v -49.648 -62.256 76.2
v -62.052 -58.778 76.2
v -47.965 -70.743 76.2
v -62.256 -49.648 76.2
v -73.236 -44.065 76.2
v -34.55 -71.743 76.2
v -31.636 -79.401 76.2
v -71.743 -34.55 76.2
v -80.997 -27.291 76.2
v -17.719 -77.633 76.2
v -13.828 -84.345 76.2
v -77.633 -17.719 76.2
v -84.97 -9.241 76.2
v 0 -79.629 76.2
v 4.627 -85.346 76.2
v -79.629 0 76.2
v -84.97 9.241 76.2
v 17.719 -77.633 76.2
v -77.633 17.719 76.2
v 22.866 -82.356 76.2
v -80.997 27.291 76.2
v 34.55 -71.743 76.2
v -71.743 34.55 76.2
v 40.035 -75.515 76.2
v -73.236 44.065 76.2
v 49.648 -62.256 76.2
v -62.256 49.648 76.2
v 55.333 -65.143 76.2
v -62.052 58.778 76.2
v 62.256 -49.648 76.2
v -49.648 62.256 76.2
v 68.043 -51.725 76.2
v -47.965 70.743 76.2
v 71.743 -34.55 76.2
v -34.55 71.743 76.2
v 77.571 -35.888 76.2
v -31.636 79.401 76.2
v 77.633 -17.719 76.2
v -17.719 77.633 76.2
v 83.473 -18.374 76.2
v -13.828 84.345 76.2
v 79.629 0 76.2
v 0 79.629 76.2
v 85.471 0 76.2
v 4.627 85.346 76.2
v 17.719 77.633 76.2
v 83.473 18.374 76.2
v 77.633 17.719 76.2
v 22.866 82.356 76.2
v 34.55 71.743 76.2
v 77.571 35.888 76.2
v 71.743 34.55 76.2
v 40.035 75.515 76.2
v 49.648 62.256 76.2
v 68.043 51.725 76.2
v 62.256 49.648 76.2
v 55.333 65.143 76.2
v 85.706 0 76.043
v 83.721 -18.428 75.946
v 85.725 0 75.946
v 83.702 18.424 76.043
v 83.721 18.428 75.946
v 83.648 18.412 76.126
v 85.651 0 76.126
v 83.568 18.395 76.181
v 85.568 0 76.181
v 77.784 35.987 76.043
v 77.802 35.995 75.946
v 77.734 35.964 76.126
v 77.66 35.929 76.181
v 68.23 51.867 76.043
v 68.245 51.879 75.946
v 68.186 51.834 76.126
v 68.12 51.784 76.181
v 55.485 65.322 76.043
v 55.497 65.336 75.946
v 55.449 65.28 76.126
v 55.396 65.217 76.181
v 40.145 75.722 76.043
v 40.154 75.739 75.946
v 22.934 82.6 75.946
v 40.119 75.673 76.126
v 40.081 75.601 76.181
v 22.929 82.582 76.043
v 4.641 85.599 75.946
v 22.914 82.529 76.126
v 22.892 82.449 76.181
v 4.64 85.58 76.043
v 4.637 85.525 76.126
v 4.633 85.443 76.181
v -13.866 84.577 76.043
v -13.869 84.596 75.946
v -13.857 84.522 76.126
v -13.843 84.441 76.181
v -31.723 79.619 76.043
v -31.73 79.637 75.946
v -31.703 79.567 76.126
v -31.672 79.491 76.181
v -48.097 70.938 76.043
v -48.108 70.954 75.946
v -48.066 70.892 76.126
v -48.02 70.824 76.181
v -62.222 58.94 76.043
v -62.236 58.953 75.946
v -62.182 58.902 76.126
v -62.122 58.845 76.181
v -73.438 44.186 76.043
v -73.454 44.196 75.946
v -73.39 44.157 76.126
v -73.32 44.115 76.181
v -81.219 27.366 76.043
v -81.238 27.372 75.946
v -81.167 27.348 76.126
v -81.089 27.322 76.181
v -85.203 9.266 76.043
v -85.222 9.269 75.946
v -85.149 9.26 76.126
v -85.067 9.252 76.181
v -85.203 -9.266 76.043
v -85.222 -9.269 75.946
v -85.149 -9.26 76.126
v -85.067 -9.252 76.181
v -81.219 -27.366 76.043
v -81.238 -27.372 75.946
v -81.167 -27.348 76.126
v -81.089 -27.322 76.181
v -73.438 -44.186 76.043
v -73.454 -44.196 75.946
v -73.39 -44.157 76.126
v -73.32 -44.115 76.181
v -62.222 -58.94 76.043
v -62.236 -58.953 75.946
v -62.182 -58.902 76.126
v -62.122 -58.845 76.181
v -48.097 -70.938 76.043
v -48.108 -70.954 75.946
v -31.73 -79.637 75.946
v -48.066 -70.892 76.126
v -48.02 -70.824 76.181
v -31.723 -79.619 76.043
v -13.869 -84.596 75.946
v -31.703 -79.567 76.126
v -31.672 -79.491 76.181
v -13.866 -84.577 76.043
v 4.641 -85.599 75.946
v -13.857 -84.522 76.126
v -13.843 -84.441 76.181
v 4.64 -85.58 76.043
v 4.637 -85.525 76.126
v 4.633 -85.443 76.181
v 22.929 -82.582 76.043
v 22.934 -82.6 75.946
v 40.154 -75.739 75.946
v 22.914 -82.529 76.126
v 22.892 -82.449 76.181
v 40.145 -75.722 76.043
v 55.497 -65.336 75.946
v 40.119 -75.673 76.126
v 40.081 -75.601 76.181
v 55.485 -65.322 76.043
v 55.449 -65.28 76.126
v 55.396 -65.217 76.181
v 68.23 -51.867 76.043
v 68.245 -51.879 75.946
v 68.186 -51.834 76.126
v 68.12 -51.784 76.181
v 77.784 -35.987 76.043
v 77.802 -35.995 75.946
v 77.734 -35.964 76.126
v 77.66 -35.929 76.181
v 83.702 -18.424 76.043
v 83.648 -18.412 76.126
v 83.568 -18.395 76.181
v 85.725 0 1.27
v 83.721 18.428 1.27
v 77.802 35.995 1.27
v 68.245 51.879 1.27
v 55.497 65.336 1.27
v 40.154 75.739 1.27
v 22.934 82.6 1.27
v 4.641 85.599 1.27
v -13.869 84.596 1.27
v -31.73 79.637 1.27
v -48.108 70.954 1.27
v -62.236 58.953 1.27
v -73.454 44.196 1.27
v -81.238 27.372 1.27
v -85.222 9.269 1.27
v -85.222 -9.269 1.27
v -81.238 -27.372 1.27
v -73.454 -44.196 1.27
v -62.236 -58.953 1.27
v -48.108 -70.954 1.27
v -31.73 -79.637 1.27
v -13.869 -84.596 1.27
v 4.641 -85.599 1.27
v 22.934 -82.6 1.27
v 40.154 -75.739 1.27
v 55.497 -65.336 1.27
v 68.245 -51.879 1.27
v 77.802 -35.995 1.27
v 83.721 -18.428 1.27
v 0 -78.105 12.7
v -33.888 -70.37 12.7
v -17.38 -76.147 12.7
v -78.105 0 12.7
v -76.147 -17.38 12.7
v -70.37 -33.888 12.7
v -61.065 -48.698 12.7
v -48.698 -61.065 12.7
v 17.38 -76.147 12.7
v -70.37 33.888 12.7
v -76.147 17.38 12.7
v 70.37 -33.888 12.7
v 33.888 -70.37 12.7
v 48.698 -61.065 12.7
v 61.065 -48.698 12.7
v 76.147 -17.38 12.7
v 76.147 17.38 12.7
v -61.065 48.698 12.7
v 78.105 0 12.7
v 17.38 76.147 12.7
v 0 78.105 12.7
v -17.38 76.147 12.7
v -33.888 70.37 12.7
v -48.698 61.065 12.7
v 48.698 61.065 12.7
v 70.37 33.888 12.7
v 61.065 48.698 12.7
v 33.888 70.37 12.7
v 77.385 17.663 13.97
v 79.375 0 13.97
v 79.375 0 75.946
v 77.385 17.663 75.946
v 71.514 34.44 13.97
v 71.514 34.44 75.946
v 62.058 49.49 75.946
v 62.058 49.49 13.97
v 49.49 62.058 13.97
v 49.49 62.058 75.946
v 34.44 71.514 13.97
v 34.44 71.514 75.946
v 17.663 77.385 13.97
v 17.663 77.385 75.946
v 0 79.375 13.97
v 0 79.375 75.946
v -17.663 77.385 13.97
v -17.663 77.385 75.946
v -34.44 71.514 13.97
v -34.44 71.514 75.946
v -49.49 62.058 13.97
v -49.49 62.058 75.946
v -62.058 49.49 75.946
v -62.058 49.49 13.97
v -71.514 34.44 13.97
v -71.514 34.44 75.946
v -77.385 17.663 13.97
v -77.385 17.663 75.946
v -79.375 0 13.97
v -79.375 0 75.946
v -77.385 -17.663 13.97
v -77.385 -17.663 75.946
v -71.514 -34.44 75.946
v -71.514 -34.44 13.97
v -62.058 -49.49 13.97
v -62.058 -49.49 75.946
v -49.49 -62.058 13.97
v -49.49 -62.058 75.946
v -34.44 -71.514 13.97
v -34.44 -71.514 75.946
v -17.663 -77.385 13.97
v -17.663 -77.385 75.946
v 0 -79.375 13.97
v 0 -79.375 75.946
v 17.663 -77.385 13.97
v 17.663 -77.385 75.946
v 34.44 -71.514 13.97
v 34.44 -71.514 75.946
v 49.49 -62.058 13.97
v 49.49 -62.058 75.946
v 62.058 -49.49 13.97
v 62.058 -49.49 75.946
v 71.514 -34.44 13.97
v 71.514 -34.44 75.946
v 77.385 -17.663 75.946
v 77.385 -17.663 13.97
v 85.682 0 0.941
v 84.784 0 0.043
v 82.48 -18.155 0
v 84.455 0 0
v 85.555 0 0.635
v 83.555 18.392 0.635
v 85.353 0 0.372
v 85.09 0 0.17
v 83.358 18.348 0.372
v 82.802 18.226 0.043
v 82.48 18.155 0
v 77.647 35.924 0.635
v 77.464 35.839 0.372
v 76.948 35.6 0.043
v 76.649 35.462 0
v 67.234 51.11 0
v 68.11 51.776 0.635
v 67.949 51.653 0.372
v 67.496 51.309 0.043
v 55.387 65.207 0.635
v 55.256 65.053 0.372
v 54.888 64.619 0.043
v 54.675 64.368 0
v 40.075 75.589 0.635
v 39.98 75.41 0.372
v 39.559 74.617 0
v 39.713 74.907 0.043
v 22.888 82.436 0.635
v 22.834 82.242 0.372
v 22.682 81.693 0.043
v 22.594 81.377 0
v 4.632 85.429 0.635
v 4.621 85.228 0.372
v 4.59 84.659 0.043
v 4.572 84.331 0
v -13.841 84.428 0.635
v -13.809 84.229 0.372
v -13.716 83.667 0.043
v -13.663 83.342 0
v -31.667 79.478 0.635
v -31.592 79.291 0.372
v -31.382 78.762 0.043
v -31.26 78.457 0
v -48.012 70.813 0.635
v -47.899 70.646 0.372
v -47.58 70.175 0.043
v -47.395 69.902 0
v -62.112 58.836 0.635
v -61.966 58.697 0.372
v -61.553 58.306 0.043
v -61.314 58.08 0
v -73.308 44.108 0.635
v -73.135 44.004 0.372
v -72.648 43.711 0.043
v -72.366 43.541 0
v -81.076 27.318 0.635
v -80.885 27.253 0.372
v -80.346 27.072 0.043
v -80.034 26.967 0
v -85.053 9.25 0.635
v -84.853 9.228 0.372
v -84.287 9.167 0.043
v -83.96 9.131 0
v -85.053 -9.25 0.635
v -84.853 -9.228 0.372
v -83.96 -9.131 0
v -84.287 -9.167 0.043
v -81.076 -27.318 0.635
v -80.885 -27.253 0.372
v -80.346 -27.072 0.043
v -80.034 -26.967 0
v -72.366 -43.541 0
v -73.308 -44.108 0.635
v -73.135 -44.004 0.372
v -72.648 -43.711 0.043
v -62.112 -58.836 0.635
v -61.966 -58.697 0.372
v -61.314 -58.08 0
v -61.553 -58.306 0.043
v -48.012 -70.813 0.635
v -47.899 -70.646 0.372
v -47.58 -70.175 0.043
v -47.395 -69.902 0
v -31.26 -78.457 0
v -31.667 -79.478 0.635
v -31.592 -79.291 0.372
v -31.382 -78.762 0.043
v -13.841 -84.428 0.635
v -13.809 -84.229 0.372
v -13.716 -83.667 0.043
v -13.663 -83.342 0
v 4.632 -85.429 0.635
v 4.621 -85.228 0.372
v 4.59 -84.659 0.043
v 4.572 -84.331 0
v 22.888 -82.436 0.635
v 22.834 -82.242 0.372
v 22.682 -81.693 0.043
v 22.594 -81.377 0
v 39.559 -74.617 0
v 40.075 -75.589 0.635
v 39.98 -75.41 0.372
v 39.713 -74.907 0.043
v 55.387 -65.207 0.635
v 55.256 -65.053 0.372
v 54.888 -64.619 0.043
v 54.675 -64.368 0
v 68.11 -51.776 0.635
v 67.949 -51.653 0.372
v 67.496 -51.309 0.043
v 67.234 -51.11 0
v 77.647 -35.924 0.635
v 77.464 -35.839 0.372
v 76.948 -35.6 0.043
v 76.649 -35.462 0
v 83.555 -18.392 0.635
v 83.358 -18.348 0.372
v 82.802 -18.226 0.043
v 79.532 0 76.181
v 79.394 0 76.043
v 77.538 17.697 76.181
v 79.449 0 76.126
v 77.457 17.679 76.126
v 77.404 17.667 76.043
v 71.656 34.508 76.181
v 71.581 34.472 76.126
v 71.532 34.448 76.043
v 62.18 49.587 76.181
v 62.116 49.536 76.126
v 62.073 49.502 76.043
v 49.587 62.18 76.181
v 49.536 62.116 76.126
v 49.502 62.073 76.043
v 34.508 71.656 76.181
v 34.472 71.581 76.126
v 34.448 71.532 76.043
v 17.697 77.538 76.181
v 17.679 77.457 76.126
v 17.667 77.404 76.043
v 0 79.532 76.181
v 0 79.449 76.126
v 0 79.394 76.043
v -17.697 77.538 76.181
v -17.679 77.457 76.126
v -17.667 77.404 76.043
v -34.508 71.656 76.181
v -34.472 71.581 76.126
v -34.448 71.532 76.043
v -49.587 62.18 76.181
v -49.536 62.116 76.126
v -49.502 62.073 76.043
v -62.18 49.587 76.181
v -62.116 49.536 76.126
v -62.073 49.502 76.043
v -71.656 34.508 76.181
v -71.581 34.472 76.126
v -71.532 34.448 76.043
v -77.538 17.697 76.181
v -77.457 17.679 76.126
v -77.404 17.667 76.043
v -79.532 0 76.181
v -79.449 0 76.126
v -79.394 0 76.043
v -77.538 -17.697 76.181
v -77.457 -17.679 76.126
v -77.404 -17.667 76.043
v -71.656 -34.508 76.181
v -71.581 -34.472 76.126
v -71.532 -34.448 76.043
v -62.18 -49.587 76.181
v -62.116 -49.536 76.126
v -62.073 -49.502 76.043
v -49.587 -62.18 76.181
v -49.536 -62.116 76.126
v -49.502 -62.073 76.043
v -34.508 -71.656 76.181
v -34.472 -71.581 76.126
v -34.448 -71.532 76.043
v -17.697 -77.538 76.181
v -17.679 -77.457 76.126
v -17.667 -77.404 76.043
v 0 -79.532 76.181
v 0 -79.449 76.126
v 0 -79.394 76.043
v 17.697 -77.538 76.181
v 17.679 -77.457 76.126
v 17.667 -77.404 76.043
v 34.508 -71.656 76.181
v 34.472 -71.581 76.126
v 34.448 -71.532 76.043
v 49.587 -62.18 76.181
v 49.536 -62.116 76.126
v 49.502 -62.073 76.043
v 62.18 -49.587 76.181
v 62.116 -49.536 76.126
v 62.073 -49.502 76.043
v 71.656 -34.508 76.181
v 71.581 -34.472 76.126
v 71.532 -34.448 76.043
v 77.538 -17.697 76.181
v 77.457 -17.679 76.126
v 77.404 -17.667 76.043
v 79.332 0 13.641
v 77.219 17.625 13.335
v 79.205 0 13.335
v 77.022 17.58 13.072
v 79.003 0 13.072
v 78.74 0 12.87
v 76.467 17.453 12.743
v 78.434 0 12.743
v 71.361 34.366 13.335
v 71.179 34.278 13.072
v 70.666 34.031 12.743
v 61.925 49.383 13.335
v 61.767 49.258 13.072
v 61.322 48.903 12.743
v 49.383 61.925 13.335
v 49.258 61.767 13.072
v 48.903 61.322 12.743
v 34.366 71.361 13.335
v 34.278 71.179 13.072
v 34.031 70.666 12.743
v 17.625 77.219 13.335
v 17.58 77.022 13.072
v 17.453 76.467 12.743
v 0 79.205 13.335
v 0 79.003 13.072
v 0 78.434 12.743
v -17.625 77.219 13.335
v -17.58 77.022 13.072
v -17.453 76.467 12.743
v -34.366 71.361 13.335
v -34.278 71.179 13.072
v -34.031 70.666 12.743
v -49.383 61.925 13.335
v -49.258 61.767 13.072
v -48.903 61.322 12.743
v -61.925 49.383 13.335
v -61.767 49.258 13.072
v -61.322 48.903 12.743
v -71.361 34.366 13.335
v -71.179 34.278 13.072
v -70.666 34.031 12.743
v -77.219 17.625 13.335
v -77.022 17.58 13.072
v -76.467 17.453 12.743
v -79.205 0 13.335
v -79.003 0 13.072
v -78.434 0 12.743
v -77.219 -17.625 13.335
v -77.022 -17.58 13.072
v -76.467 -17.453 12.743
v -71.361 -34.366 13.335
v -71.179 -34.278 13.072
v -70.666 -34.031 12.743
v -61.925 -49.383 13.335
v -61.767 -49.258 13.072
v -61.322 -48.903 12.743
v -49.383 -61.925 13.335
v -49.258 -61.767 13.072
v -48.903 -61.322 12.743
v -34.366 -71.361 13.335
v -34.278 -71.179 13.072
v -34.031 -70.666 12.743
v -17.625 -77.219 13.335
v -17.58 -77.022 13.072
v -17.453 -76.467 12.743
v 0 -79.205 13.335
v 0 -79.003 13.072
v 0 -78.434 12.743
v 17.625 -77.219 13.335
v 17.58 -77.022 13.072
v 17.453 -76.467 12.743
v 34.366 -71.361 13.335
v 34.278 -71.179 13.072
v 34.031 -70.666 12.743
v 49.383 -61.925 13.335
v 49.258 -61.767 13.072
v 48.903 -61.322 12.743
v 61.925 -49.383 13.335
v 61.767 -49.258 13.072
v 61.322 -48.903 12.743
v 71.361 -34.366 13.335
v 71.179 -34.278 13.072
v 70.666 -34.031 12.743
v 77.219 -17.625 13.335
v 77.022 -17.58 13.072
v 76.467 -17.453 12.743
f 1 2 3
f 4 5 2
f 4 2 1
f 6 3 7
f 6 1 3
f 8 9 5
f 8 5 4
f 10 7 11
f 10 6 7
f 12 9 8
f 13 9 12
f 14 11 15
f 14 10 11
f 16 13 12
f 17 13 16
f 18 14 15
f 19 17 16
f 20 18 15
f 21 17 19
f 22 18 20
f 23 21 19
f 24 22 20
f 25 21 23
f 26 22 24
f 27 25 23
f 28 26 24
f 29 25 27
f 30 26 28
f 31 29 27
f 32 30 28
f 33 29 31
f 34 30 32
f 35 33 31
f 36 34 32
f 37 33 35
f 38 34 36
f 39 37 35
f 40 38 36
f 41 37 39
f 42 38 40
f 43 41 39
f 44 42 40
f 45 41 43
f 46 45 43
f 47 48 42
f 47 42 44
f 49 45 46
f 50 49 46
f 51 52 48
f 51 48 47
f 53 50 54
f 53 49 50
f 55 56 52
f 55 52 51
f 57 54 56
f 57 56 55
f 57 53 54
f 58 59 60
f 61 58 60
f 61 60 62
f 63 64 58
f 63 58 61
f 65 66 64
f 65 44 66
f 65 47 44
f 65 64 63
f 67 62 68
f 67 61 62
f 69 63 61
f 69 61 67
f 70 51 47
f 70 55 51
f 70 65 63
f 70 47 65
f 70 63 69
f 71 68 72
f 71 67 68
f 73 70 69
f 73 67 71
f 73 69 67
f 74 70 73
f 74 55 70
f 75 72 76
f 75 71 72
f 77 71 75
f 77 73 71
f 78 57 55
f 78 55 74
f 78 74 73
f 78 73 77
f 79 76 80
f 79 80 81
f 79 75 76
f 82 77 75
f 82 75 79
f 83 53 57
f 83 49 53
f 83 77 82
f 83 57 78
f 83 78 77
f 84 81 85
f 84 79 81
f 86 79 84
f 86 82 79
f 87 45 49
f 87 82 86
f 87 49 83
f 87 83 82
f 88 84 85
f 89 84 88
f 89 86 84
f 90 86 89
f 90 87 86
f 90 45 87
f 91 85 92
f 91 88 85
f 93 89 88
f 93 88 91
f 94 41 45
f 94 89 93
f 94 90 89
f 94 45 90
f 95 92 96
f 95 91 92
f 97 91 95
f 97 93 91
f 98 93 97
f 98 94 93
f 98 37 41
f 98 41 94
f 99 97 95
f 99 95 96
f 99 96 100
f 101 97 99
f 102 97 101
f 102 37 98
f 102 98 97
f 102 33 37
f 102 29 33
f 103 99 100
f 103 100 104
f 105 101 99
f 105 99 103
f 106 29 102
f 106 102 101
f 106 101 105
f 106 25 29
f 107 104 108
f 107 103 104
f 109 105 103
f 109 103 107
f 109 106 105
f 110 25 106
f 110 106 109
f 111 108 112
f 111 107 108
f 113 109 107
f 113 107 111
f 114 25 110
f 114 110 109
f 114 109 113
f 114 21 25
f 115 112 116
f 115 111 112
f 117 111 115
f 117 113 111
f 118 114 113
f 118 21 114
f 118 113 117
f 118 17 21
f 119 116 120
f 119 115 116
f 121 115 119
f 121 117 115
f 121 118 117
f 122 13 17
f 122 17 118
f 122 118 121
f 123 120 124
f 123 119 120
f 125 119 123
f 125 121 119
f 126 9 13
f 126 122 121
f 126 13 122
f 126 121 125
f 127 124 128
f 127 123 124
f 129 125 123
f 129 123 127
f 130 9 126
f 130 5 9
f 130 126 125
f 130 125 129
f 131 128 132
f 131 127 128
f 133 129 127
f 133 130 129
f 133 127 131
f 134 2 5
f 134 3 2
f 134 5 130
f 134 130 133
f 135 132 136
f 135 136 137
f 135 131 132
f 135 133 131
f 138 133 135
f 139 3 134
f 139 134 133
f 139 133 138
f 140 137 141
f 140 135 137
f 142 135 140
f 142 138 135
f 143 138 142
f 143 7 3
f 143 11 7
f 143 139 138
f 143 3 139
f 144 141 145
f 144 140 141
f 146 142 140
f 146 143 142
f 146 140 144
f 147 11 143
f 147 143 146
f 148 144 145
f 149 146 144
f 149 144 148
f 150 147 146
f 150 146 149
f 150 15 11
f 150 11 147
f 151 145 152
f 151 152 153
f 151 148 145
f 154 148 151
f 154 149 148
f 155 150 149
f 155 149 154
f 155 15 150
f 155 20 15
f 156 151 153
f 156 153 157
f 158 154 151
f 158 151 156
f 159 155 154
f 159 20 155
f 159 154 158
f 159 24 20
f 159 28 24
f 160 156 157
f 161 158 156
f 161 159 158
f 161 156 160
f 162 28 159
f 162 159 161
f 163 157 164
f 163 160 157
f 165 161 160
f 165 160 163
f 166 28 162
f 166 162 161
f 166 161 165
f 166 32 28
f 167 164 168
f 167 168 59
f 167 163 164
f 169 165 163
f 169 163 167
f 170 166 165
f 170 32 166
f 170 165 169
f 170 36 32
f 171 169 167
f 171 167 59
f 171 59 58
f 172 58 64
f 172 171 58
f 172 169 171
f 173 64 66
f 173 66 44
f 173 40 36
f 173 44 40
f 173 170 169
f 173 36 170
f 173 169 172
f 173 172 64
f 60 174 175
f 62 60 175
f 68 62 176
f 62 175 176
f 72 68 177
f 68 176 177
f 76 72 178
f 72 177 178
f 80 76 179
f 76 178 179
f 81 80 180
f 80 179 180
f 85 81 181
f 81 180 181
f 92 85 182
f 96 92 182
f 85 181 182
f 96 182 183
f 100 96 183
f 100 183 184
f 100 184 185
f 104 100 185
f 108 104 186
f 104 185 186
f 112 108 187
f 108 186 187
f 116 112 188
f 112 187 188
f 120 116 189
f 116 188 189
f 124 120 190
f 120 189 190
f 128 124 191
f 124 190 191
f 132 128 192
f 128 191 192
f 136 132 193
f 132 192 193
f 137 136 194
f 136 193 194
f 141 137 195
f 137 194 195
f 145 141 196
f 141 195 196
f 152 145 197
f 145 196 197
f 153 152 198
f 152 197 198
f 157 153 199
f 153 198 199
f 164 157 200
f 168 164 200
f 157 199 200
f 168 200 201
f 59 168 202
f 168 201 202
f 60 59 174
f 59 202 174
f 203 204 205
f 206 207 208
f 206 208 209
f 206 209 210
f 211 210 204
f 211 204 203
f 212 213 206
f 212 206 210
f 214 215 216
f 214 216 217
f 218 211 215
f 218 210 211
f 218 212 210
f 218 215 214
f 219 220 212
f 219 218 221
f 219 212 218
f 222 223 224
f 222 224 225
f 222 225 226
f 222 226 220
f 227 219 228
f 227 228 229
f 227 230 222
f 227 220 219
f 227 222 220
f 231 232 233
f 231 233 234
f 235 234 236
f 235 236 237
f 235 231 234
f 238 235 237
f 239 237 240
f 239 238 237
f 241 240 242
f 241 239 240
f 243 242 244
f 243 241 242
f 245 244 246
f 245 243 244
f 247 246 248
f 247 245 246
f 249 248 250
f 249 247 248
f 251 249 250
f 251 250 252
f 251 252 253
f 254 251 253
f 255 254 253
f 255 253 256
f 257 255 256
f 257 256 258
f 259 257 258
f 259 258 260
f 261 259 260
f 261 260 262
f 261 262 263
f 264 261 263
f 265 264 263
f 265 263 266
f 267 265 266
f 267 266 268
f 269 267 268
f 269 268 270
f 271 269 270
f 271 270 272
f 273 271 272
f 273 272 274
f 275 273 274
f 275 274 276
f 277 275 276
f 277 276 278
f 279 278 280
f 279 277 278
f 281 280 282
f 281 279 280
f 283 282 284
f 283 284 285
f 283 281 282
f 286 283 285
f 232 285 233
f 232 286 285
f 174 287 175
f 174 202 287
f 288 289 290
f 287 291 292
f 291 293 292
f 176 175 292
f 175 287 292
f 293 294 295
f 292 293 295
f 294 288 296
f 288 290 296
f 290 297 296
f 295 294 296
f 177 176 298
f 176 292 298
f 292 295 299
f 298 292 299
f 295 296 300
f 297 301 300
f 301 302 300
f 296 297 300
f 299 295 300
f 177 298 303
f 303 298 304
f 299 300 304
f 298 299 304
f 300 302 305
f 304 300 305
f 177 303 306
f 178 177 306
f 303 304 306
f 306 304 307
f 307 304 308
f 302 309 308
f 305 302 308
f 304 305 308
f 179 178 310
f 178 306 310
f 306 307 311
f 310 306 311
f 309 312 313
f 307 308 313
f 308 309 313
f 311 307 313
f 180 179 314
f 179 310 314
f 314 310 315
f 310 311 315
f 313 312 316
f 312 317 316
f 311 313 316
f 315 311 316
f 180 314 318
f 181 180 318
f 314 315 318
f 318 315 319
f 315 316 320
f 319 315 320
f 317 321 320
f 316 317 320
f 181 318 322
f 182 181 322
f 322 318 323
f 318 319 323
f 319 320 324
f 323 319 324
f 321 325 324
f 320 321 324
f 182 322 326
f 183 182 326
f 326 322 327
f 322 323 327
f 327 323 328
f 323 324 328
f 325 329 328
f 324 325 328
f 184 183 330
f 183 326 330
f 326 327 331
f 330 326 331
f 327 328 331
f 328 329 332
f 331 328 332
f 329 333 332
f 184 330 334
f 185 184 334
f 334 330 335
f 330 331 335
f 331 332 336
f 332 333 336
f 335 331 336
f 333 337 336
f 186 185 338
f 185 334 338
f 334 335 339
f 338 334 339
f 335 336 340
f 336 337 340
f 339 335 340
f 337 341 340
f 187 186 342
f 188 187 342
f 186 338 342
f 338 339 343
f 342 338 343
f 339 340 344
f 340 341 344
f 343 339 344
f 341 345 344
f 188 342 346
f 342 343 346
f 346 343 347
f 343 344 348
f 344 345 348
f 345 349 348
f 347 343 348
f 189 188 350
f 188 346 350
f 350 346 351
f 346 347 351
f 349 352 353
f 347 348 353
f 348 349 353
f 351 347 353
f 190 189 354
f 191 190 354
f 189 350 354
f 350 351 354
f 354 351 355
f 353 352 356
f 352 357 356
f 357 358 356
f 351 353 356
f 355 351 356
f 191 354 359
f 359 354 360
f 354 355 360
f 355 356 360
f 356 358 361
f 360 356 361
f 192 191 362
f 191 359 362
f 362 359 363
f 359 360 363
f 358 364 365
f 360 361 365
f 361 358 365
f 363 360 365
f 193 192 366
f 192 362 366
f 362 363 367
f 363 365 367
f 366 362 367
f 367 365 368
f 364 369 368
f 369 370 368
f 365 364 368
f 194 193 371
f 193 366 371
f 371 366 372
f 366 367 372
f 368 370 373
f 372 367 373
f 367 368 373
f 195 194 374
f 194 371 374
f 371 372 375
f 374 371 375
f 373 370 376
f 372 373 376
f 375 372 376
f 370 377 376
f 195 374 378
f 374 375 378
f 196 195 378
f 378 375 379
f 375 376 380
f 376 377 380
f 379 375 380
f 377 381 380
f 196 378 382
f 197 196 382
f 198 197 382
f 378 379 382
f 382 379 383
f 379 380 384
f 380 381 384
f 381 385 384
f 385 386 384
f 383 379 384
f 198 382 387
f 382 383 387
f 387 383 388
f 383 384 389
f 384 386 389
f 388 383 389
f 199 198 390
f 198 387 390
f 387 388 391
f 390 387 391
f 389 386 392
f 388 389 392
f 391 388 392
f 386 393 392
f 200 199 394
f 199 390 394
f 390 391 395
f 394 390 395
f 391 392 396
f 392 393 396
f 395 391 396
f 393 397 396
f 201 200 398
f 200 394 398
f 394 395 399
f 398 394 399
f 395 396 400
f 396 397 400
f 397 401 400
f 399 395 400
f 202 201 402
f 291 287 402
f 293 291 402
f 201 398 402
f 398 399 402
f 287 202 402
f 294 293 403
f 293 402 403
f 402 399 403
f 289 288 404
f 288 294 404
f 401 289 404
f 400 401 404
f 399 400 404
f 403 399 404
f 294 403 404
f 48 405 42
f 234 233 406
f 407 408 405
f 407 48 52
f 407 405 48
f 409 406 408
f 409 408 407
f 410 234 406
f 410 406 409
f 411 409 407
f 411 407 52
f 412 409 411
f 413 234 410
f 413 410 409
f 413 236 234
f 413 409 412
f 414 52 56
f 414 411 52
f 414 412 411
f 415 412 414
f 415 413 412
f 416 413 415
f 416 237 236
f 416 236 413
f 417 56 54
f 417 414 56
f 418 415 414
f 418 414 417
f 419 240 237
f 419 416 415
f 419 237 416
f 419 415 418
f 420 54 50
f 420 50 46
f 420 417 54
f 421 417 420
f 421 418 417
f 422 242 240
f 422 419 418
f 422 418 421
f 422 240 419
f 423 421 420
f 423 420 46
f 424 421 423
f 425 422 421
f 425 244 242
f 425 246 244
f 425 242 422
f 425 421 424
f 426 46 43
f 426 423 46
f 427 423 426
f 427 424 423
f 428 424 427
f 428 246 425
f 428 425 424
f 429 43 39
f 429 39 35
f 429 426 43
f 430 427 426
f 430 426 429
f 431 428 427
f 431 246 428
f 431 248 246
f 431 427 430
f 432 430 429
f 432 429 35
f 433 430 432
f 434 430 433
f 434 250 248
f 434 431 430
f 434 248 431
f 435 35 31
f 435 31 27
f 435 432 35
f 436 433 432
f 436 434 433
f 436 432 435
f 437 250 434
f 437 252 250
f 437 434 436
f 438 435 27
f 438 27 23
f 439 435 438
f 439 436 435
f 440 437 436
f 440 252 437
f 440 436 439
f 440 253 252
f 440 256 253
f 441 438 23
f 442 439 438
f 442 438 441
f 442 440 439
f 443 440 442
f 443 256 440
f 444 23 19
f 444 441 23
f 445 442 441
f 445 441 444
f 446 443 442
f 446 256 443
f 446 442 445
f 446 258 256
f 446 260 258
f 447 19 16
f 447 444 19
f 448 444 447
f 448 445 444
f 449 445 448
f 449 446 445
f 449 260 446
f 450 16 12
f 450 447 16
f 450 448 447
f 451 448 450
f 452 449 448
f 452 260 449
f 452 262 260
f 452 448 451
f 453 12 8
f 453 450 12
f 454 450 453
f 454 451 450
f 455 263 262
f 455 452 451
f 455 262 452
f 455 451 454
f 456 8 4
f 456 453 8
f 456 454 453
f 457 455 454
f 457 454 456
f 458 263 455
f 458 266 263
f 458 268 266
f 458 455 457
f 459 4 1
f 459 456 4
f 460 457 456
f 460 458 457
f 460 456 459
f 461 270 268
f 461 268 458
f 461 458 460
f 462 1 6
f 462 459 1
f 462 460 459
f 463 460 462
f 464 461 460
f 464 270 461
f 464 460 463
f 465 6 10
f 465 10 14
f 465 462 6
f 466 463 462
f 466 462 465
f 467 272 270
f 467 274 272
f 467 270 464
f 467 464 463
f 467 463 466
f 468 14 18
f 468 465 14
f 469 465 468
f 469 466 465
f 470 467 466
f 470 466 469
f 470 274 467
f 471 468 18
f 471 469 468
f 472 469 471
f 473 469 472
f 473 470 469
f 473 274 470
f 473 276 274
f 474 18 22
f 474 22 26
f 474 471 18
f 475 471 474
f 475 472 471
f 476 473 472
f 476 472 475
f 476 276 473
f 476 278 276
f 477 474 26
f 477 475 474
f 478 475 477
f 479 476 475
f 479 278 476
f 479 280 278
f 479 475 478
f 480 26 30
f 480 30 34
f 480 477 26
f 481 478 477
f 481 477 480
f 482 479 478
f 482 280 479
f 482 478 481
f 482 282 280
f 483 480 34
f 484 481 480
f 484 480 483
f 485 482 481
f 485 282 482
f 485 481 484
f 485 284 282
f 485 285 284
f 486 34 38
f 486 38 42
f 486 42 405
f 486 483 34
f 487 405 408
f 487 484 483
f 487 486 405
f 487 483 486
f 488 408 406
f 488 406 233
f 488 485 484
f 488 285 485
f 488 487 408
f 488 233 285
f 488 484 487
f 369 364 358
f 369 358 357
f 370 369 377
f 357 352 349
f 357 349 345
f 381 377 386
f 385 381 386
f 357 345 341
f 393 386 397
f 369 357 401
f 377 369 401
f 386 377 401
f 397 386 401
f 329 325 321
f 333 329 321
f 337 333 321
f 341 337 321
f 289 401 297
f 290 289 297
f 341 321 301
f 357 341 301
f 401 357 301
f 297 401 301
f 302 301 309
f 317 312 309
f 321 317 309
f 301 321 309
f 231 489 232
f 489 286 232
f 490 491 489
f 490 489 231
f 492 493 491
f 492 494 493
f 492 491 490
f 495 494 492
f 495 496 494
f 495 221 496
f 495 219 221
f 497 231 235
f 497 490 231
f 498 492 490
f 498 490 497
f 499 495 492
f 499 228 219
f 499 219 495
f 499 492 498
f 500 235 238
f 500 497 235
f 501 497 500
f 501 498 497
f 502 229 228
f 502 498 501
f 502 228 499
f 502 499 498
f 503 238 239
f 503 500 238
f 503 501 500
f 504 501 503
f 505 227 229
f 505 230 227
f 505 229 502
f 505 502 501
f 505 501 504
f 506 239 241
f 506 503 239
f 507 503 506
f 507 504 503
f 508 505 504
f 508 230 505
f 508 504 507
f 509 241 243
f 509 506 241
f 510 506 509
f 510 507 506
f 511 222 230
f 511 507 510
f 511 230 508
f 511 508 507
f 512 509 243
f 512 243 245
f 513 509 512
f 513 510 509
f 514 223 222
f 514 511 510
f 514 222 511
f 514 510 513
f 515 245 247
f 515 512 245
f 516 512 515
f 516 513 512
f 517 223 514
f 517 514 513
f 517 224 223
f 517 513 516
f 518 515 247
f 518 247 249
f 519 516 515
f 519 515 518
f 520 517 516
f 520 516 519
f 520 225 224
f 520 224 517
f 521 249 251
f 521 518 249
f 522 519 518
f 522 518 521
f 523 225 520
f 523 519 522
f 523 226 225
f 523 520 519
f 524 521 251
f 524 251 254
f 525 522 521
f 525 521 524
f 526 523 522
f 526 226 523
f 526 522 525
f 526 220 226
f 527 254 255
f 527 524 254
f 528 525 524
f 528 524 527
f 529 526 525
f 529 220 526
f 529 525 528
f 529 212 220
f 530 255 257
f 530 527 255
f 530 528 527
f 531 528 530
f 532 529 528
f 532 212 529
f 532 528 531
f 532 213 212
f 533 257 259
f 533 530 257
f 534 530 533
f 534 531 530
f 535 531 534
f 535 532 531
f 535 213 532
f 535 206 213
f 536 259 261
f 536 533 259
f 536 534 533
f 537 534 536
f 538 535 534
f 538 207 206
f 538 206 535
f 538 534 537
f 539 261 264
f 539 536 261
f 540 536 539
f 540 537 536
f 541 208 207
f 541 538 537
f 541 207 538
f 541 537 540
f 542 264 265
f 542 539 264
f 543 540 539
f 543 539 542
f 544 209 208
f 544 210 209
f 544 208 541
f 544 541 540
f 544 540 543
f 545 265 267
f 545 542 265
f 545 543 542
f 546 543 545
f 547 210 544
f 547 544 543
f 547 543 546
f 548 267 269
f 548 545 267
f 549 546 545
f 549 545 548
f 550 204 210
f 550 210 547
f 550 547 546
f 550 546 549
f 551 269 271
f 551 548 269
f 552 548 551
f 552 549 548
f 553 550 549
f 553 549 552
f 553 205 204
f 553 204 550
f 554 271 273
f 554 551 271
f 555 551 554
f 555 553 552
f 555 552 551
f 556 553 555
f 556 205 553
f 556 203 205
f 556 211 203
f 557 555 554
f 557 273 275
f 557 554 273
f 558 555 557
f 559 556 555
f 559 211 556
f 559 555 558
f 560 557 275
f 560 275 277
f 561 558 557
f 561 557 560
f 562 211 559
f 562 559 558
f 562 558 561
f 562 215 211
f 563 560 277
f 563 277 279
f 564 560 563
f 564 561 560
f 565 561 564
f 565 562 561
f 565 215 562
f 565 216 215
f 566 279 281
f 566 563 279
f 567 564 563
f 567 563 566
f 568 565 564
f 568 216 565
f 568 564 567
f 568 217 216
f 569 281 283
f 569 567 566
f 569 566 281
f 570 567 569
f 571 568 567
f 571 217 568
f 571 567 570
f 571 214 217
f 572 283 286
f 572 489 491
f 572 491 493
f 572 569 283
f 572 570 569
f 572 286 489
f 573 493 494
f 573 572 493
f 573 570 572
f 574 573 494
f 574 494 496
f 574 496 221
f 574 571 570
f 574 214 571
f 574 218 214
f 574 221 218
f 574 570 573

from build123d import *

# Parameters (mm, degrees)
F0_R     = 79.375
F1_DEPTH = 12.7
F0_R_2   = 85.725
F2_DEPTH = 76.2
F3_R     = 1.27
F4_R     = 0.254


with BuildPart() as f1:
    # F0 (on Top) → F1 (new body)
    with BuildSketch(Plane.XY):
        Circle(F0_R)
    extrude(amount=F1_DEPTH)

    # F0 (on Top) → F2 (join)
    with BuildSketch(Plane.XY):
        Circle(F0_R_2)
        Circle(F0_R, mode=Mode.SUBTRACT)
    extrude(amount=F2_DEPTH)

    # F3
    f3_edges = [f1.edges().sort_by_distance(p)[0] for p in [
        (-85.725, 0, 0),
        (-79.375, 0, 12.7),
    ]]
    fillet(f3_edges, radius=F3_R)

    # F4
    f4_edges = [f1.edges().sort_by_distance(p)[0] for p in [
        (-79.375, 0, 76.2),
        (-85.725, 0, 76.2),
    ]]
    fillet(f4_edges, radius=F4_R)


solid = f1.part
